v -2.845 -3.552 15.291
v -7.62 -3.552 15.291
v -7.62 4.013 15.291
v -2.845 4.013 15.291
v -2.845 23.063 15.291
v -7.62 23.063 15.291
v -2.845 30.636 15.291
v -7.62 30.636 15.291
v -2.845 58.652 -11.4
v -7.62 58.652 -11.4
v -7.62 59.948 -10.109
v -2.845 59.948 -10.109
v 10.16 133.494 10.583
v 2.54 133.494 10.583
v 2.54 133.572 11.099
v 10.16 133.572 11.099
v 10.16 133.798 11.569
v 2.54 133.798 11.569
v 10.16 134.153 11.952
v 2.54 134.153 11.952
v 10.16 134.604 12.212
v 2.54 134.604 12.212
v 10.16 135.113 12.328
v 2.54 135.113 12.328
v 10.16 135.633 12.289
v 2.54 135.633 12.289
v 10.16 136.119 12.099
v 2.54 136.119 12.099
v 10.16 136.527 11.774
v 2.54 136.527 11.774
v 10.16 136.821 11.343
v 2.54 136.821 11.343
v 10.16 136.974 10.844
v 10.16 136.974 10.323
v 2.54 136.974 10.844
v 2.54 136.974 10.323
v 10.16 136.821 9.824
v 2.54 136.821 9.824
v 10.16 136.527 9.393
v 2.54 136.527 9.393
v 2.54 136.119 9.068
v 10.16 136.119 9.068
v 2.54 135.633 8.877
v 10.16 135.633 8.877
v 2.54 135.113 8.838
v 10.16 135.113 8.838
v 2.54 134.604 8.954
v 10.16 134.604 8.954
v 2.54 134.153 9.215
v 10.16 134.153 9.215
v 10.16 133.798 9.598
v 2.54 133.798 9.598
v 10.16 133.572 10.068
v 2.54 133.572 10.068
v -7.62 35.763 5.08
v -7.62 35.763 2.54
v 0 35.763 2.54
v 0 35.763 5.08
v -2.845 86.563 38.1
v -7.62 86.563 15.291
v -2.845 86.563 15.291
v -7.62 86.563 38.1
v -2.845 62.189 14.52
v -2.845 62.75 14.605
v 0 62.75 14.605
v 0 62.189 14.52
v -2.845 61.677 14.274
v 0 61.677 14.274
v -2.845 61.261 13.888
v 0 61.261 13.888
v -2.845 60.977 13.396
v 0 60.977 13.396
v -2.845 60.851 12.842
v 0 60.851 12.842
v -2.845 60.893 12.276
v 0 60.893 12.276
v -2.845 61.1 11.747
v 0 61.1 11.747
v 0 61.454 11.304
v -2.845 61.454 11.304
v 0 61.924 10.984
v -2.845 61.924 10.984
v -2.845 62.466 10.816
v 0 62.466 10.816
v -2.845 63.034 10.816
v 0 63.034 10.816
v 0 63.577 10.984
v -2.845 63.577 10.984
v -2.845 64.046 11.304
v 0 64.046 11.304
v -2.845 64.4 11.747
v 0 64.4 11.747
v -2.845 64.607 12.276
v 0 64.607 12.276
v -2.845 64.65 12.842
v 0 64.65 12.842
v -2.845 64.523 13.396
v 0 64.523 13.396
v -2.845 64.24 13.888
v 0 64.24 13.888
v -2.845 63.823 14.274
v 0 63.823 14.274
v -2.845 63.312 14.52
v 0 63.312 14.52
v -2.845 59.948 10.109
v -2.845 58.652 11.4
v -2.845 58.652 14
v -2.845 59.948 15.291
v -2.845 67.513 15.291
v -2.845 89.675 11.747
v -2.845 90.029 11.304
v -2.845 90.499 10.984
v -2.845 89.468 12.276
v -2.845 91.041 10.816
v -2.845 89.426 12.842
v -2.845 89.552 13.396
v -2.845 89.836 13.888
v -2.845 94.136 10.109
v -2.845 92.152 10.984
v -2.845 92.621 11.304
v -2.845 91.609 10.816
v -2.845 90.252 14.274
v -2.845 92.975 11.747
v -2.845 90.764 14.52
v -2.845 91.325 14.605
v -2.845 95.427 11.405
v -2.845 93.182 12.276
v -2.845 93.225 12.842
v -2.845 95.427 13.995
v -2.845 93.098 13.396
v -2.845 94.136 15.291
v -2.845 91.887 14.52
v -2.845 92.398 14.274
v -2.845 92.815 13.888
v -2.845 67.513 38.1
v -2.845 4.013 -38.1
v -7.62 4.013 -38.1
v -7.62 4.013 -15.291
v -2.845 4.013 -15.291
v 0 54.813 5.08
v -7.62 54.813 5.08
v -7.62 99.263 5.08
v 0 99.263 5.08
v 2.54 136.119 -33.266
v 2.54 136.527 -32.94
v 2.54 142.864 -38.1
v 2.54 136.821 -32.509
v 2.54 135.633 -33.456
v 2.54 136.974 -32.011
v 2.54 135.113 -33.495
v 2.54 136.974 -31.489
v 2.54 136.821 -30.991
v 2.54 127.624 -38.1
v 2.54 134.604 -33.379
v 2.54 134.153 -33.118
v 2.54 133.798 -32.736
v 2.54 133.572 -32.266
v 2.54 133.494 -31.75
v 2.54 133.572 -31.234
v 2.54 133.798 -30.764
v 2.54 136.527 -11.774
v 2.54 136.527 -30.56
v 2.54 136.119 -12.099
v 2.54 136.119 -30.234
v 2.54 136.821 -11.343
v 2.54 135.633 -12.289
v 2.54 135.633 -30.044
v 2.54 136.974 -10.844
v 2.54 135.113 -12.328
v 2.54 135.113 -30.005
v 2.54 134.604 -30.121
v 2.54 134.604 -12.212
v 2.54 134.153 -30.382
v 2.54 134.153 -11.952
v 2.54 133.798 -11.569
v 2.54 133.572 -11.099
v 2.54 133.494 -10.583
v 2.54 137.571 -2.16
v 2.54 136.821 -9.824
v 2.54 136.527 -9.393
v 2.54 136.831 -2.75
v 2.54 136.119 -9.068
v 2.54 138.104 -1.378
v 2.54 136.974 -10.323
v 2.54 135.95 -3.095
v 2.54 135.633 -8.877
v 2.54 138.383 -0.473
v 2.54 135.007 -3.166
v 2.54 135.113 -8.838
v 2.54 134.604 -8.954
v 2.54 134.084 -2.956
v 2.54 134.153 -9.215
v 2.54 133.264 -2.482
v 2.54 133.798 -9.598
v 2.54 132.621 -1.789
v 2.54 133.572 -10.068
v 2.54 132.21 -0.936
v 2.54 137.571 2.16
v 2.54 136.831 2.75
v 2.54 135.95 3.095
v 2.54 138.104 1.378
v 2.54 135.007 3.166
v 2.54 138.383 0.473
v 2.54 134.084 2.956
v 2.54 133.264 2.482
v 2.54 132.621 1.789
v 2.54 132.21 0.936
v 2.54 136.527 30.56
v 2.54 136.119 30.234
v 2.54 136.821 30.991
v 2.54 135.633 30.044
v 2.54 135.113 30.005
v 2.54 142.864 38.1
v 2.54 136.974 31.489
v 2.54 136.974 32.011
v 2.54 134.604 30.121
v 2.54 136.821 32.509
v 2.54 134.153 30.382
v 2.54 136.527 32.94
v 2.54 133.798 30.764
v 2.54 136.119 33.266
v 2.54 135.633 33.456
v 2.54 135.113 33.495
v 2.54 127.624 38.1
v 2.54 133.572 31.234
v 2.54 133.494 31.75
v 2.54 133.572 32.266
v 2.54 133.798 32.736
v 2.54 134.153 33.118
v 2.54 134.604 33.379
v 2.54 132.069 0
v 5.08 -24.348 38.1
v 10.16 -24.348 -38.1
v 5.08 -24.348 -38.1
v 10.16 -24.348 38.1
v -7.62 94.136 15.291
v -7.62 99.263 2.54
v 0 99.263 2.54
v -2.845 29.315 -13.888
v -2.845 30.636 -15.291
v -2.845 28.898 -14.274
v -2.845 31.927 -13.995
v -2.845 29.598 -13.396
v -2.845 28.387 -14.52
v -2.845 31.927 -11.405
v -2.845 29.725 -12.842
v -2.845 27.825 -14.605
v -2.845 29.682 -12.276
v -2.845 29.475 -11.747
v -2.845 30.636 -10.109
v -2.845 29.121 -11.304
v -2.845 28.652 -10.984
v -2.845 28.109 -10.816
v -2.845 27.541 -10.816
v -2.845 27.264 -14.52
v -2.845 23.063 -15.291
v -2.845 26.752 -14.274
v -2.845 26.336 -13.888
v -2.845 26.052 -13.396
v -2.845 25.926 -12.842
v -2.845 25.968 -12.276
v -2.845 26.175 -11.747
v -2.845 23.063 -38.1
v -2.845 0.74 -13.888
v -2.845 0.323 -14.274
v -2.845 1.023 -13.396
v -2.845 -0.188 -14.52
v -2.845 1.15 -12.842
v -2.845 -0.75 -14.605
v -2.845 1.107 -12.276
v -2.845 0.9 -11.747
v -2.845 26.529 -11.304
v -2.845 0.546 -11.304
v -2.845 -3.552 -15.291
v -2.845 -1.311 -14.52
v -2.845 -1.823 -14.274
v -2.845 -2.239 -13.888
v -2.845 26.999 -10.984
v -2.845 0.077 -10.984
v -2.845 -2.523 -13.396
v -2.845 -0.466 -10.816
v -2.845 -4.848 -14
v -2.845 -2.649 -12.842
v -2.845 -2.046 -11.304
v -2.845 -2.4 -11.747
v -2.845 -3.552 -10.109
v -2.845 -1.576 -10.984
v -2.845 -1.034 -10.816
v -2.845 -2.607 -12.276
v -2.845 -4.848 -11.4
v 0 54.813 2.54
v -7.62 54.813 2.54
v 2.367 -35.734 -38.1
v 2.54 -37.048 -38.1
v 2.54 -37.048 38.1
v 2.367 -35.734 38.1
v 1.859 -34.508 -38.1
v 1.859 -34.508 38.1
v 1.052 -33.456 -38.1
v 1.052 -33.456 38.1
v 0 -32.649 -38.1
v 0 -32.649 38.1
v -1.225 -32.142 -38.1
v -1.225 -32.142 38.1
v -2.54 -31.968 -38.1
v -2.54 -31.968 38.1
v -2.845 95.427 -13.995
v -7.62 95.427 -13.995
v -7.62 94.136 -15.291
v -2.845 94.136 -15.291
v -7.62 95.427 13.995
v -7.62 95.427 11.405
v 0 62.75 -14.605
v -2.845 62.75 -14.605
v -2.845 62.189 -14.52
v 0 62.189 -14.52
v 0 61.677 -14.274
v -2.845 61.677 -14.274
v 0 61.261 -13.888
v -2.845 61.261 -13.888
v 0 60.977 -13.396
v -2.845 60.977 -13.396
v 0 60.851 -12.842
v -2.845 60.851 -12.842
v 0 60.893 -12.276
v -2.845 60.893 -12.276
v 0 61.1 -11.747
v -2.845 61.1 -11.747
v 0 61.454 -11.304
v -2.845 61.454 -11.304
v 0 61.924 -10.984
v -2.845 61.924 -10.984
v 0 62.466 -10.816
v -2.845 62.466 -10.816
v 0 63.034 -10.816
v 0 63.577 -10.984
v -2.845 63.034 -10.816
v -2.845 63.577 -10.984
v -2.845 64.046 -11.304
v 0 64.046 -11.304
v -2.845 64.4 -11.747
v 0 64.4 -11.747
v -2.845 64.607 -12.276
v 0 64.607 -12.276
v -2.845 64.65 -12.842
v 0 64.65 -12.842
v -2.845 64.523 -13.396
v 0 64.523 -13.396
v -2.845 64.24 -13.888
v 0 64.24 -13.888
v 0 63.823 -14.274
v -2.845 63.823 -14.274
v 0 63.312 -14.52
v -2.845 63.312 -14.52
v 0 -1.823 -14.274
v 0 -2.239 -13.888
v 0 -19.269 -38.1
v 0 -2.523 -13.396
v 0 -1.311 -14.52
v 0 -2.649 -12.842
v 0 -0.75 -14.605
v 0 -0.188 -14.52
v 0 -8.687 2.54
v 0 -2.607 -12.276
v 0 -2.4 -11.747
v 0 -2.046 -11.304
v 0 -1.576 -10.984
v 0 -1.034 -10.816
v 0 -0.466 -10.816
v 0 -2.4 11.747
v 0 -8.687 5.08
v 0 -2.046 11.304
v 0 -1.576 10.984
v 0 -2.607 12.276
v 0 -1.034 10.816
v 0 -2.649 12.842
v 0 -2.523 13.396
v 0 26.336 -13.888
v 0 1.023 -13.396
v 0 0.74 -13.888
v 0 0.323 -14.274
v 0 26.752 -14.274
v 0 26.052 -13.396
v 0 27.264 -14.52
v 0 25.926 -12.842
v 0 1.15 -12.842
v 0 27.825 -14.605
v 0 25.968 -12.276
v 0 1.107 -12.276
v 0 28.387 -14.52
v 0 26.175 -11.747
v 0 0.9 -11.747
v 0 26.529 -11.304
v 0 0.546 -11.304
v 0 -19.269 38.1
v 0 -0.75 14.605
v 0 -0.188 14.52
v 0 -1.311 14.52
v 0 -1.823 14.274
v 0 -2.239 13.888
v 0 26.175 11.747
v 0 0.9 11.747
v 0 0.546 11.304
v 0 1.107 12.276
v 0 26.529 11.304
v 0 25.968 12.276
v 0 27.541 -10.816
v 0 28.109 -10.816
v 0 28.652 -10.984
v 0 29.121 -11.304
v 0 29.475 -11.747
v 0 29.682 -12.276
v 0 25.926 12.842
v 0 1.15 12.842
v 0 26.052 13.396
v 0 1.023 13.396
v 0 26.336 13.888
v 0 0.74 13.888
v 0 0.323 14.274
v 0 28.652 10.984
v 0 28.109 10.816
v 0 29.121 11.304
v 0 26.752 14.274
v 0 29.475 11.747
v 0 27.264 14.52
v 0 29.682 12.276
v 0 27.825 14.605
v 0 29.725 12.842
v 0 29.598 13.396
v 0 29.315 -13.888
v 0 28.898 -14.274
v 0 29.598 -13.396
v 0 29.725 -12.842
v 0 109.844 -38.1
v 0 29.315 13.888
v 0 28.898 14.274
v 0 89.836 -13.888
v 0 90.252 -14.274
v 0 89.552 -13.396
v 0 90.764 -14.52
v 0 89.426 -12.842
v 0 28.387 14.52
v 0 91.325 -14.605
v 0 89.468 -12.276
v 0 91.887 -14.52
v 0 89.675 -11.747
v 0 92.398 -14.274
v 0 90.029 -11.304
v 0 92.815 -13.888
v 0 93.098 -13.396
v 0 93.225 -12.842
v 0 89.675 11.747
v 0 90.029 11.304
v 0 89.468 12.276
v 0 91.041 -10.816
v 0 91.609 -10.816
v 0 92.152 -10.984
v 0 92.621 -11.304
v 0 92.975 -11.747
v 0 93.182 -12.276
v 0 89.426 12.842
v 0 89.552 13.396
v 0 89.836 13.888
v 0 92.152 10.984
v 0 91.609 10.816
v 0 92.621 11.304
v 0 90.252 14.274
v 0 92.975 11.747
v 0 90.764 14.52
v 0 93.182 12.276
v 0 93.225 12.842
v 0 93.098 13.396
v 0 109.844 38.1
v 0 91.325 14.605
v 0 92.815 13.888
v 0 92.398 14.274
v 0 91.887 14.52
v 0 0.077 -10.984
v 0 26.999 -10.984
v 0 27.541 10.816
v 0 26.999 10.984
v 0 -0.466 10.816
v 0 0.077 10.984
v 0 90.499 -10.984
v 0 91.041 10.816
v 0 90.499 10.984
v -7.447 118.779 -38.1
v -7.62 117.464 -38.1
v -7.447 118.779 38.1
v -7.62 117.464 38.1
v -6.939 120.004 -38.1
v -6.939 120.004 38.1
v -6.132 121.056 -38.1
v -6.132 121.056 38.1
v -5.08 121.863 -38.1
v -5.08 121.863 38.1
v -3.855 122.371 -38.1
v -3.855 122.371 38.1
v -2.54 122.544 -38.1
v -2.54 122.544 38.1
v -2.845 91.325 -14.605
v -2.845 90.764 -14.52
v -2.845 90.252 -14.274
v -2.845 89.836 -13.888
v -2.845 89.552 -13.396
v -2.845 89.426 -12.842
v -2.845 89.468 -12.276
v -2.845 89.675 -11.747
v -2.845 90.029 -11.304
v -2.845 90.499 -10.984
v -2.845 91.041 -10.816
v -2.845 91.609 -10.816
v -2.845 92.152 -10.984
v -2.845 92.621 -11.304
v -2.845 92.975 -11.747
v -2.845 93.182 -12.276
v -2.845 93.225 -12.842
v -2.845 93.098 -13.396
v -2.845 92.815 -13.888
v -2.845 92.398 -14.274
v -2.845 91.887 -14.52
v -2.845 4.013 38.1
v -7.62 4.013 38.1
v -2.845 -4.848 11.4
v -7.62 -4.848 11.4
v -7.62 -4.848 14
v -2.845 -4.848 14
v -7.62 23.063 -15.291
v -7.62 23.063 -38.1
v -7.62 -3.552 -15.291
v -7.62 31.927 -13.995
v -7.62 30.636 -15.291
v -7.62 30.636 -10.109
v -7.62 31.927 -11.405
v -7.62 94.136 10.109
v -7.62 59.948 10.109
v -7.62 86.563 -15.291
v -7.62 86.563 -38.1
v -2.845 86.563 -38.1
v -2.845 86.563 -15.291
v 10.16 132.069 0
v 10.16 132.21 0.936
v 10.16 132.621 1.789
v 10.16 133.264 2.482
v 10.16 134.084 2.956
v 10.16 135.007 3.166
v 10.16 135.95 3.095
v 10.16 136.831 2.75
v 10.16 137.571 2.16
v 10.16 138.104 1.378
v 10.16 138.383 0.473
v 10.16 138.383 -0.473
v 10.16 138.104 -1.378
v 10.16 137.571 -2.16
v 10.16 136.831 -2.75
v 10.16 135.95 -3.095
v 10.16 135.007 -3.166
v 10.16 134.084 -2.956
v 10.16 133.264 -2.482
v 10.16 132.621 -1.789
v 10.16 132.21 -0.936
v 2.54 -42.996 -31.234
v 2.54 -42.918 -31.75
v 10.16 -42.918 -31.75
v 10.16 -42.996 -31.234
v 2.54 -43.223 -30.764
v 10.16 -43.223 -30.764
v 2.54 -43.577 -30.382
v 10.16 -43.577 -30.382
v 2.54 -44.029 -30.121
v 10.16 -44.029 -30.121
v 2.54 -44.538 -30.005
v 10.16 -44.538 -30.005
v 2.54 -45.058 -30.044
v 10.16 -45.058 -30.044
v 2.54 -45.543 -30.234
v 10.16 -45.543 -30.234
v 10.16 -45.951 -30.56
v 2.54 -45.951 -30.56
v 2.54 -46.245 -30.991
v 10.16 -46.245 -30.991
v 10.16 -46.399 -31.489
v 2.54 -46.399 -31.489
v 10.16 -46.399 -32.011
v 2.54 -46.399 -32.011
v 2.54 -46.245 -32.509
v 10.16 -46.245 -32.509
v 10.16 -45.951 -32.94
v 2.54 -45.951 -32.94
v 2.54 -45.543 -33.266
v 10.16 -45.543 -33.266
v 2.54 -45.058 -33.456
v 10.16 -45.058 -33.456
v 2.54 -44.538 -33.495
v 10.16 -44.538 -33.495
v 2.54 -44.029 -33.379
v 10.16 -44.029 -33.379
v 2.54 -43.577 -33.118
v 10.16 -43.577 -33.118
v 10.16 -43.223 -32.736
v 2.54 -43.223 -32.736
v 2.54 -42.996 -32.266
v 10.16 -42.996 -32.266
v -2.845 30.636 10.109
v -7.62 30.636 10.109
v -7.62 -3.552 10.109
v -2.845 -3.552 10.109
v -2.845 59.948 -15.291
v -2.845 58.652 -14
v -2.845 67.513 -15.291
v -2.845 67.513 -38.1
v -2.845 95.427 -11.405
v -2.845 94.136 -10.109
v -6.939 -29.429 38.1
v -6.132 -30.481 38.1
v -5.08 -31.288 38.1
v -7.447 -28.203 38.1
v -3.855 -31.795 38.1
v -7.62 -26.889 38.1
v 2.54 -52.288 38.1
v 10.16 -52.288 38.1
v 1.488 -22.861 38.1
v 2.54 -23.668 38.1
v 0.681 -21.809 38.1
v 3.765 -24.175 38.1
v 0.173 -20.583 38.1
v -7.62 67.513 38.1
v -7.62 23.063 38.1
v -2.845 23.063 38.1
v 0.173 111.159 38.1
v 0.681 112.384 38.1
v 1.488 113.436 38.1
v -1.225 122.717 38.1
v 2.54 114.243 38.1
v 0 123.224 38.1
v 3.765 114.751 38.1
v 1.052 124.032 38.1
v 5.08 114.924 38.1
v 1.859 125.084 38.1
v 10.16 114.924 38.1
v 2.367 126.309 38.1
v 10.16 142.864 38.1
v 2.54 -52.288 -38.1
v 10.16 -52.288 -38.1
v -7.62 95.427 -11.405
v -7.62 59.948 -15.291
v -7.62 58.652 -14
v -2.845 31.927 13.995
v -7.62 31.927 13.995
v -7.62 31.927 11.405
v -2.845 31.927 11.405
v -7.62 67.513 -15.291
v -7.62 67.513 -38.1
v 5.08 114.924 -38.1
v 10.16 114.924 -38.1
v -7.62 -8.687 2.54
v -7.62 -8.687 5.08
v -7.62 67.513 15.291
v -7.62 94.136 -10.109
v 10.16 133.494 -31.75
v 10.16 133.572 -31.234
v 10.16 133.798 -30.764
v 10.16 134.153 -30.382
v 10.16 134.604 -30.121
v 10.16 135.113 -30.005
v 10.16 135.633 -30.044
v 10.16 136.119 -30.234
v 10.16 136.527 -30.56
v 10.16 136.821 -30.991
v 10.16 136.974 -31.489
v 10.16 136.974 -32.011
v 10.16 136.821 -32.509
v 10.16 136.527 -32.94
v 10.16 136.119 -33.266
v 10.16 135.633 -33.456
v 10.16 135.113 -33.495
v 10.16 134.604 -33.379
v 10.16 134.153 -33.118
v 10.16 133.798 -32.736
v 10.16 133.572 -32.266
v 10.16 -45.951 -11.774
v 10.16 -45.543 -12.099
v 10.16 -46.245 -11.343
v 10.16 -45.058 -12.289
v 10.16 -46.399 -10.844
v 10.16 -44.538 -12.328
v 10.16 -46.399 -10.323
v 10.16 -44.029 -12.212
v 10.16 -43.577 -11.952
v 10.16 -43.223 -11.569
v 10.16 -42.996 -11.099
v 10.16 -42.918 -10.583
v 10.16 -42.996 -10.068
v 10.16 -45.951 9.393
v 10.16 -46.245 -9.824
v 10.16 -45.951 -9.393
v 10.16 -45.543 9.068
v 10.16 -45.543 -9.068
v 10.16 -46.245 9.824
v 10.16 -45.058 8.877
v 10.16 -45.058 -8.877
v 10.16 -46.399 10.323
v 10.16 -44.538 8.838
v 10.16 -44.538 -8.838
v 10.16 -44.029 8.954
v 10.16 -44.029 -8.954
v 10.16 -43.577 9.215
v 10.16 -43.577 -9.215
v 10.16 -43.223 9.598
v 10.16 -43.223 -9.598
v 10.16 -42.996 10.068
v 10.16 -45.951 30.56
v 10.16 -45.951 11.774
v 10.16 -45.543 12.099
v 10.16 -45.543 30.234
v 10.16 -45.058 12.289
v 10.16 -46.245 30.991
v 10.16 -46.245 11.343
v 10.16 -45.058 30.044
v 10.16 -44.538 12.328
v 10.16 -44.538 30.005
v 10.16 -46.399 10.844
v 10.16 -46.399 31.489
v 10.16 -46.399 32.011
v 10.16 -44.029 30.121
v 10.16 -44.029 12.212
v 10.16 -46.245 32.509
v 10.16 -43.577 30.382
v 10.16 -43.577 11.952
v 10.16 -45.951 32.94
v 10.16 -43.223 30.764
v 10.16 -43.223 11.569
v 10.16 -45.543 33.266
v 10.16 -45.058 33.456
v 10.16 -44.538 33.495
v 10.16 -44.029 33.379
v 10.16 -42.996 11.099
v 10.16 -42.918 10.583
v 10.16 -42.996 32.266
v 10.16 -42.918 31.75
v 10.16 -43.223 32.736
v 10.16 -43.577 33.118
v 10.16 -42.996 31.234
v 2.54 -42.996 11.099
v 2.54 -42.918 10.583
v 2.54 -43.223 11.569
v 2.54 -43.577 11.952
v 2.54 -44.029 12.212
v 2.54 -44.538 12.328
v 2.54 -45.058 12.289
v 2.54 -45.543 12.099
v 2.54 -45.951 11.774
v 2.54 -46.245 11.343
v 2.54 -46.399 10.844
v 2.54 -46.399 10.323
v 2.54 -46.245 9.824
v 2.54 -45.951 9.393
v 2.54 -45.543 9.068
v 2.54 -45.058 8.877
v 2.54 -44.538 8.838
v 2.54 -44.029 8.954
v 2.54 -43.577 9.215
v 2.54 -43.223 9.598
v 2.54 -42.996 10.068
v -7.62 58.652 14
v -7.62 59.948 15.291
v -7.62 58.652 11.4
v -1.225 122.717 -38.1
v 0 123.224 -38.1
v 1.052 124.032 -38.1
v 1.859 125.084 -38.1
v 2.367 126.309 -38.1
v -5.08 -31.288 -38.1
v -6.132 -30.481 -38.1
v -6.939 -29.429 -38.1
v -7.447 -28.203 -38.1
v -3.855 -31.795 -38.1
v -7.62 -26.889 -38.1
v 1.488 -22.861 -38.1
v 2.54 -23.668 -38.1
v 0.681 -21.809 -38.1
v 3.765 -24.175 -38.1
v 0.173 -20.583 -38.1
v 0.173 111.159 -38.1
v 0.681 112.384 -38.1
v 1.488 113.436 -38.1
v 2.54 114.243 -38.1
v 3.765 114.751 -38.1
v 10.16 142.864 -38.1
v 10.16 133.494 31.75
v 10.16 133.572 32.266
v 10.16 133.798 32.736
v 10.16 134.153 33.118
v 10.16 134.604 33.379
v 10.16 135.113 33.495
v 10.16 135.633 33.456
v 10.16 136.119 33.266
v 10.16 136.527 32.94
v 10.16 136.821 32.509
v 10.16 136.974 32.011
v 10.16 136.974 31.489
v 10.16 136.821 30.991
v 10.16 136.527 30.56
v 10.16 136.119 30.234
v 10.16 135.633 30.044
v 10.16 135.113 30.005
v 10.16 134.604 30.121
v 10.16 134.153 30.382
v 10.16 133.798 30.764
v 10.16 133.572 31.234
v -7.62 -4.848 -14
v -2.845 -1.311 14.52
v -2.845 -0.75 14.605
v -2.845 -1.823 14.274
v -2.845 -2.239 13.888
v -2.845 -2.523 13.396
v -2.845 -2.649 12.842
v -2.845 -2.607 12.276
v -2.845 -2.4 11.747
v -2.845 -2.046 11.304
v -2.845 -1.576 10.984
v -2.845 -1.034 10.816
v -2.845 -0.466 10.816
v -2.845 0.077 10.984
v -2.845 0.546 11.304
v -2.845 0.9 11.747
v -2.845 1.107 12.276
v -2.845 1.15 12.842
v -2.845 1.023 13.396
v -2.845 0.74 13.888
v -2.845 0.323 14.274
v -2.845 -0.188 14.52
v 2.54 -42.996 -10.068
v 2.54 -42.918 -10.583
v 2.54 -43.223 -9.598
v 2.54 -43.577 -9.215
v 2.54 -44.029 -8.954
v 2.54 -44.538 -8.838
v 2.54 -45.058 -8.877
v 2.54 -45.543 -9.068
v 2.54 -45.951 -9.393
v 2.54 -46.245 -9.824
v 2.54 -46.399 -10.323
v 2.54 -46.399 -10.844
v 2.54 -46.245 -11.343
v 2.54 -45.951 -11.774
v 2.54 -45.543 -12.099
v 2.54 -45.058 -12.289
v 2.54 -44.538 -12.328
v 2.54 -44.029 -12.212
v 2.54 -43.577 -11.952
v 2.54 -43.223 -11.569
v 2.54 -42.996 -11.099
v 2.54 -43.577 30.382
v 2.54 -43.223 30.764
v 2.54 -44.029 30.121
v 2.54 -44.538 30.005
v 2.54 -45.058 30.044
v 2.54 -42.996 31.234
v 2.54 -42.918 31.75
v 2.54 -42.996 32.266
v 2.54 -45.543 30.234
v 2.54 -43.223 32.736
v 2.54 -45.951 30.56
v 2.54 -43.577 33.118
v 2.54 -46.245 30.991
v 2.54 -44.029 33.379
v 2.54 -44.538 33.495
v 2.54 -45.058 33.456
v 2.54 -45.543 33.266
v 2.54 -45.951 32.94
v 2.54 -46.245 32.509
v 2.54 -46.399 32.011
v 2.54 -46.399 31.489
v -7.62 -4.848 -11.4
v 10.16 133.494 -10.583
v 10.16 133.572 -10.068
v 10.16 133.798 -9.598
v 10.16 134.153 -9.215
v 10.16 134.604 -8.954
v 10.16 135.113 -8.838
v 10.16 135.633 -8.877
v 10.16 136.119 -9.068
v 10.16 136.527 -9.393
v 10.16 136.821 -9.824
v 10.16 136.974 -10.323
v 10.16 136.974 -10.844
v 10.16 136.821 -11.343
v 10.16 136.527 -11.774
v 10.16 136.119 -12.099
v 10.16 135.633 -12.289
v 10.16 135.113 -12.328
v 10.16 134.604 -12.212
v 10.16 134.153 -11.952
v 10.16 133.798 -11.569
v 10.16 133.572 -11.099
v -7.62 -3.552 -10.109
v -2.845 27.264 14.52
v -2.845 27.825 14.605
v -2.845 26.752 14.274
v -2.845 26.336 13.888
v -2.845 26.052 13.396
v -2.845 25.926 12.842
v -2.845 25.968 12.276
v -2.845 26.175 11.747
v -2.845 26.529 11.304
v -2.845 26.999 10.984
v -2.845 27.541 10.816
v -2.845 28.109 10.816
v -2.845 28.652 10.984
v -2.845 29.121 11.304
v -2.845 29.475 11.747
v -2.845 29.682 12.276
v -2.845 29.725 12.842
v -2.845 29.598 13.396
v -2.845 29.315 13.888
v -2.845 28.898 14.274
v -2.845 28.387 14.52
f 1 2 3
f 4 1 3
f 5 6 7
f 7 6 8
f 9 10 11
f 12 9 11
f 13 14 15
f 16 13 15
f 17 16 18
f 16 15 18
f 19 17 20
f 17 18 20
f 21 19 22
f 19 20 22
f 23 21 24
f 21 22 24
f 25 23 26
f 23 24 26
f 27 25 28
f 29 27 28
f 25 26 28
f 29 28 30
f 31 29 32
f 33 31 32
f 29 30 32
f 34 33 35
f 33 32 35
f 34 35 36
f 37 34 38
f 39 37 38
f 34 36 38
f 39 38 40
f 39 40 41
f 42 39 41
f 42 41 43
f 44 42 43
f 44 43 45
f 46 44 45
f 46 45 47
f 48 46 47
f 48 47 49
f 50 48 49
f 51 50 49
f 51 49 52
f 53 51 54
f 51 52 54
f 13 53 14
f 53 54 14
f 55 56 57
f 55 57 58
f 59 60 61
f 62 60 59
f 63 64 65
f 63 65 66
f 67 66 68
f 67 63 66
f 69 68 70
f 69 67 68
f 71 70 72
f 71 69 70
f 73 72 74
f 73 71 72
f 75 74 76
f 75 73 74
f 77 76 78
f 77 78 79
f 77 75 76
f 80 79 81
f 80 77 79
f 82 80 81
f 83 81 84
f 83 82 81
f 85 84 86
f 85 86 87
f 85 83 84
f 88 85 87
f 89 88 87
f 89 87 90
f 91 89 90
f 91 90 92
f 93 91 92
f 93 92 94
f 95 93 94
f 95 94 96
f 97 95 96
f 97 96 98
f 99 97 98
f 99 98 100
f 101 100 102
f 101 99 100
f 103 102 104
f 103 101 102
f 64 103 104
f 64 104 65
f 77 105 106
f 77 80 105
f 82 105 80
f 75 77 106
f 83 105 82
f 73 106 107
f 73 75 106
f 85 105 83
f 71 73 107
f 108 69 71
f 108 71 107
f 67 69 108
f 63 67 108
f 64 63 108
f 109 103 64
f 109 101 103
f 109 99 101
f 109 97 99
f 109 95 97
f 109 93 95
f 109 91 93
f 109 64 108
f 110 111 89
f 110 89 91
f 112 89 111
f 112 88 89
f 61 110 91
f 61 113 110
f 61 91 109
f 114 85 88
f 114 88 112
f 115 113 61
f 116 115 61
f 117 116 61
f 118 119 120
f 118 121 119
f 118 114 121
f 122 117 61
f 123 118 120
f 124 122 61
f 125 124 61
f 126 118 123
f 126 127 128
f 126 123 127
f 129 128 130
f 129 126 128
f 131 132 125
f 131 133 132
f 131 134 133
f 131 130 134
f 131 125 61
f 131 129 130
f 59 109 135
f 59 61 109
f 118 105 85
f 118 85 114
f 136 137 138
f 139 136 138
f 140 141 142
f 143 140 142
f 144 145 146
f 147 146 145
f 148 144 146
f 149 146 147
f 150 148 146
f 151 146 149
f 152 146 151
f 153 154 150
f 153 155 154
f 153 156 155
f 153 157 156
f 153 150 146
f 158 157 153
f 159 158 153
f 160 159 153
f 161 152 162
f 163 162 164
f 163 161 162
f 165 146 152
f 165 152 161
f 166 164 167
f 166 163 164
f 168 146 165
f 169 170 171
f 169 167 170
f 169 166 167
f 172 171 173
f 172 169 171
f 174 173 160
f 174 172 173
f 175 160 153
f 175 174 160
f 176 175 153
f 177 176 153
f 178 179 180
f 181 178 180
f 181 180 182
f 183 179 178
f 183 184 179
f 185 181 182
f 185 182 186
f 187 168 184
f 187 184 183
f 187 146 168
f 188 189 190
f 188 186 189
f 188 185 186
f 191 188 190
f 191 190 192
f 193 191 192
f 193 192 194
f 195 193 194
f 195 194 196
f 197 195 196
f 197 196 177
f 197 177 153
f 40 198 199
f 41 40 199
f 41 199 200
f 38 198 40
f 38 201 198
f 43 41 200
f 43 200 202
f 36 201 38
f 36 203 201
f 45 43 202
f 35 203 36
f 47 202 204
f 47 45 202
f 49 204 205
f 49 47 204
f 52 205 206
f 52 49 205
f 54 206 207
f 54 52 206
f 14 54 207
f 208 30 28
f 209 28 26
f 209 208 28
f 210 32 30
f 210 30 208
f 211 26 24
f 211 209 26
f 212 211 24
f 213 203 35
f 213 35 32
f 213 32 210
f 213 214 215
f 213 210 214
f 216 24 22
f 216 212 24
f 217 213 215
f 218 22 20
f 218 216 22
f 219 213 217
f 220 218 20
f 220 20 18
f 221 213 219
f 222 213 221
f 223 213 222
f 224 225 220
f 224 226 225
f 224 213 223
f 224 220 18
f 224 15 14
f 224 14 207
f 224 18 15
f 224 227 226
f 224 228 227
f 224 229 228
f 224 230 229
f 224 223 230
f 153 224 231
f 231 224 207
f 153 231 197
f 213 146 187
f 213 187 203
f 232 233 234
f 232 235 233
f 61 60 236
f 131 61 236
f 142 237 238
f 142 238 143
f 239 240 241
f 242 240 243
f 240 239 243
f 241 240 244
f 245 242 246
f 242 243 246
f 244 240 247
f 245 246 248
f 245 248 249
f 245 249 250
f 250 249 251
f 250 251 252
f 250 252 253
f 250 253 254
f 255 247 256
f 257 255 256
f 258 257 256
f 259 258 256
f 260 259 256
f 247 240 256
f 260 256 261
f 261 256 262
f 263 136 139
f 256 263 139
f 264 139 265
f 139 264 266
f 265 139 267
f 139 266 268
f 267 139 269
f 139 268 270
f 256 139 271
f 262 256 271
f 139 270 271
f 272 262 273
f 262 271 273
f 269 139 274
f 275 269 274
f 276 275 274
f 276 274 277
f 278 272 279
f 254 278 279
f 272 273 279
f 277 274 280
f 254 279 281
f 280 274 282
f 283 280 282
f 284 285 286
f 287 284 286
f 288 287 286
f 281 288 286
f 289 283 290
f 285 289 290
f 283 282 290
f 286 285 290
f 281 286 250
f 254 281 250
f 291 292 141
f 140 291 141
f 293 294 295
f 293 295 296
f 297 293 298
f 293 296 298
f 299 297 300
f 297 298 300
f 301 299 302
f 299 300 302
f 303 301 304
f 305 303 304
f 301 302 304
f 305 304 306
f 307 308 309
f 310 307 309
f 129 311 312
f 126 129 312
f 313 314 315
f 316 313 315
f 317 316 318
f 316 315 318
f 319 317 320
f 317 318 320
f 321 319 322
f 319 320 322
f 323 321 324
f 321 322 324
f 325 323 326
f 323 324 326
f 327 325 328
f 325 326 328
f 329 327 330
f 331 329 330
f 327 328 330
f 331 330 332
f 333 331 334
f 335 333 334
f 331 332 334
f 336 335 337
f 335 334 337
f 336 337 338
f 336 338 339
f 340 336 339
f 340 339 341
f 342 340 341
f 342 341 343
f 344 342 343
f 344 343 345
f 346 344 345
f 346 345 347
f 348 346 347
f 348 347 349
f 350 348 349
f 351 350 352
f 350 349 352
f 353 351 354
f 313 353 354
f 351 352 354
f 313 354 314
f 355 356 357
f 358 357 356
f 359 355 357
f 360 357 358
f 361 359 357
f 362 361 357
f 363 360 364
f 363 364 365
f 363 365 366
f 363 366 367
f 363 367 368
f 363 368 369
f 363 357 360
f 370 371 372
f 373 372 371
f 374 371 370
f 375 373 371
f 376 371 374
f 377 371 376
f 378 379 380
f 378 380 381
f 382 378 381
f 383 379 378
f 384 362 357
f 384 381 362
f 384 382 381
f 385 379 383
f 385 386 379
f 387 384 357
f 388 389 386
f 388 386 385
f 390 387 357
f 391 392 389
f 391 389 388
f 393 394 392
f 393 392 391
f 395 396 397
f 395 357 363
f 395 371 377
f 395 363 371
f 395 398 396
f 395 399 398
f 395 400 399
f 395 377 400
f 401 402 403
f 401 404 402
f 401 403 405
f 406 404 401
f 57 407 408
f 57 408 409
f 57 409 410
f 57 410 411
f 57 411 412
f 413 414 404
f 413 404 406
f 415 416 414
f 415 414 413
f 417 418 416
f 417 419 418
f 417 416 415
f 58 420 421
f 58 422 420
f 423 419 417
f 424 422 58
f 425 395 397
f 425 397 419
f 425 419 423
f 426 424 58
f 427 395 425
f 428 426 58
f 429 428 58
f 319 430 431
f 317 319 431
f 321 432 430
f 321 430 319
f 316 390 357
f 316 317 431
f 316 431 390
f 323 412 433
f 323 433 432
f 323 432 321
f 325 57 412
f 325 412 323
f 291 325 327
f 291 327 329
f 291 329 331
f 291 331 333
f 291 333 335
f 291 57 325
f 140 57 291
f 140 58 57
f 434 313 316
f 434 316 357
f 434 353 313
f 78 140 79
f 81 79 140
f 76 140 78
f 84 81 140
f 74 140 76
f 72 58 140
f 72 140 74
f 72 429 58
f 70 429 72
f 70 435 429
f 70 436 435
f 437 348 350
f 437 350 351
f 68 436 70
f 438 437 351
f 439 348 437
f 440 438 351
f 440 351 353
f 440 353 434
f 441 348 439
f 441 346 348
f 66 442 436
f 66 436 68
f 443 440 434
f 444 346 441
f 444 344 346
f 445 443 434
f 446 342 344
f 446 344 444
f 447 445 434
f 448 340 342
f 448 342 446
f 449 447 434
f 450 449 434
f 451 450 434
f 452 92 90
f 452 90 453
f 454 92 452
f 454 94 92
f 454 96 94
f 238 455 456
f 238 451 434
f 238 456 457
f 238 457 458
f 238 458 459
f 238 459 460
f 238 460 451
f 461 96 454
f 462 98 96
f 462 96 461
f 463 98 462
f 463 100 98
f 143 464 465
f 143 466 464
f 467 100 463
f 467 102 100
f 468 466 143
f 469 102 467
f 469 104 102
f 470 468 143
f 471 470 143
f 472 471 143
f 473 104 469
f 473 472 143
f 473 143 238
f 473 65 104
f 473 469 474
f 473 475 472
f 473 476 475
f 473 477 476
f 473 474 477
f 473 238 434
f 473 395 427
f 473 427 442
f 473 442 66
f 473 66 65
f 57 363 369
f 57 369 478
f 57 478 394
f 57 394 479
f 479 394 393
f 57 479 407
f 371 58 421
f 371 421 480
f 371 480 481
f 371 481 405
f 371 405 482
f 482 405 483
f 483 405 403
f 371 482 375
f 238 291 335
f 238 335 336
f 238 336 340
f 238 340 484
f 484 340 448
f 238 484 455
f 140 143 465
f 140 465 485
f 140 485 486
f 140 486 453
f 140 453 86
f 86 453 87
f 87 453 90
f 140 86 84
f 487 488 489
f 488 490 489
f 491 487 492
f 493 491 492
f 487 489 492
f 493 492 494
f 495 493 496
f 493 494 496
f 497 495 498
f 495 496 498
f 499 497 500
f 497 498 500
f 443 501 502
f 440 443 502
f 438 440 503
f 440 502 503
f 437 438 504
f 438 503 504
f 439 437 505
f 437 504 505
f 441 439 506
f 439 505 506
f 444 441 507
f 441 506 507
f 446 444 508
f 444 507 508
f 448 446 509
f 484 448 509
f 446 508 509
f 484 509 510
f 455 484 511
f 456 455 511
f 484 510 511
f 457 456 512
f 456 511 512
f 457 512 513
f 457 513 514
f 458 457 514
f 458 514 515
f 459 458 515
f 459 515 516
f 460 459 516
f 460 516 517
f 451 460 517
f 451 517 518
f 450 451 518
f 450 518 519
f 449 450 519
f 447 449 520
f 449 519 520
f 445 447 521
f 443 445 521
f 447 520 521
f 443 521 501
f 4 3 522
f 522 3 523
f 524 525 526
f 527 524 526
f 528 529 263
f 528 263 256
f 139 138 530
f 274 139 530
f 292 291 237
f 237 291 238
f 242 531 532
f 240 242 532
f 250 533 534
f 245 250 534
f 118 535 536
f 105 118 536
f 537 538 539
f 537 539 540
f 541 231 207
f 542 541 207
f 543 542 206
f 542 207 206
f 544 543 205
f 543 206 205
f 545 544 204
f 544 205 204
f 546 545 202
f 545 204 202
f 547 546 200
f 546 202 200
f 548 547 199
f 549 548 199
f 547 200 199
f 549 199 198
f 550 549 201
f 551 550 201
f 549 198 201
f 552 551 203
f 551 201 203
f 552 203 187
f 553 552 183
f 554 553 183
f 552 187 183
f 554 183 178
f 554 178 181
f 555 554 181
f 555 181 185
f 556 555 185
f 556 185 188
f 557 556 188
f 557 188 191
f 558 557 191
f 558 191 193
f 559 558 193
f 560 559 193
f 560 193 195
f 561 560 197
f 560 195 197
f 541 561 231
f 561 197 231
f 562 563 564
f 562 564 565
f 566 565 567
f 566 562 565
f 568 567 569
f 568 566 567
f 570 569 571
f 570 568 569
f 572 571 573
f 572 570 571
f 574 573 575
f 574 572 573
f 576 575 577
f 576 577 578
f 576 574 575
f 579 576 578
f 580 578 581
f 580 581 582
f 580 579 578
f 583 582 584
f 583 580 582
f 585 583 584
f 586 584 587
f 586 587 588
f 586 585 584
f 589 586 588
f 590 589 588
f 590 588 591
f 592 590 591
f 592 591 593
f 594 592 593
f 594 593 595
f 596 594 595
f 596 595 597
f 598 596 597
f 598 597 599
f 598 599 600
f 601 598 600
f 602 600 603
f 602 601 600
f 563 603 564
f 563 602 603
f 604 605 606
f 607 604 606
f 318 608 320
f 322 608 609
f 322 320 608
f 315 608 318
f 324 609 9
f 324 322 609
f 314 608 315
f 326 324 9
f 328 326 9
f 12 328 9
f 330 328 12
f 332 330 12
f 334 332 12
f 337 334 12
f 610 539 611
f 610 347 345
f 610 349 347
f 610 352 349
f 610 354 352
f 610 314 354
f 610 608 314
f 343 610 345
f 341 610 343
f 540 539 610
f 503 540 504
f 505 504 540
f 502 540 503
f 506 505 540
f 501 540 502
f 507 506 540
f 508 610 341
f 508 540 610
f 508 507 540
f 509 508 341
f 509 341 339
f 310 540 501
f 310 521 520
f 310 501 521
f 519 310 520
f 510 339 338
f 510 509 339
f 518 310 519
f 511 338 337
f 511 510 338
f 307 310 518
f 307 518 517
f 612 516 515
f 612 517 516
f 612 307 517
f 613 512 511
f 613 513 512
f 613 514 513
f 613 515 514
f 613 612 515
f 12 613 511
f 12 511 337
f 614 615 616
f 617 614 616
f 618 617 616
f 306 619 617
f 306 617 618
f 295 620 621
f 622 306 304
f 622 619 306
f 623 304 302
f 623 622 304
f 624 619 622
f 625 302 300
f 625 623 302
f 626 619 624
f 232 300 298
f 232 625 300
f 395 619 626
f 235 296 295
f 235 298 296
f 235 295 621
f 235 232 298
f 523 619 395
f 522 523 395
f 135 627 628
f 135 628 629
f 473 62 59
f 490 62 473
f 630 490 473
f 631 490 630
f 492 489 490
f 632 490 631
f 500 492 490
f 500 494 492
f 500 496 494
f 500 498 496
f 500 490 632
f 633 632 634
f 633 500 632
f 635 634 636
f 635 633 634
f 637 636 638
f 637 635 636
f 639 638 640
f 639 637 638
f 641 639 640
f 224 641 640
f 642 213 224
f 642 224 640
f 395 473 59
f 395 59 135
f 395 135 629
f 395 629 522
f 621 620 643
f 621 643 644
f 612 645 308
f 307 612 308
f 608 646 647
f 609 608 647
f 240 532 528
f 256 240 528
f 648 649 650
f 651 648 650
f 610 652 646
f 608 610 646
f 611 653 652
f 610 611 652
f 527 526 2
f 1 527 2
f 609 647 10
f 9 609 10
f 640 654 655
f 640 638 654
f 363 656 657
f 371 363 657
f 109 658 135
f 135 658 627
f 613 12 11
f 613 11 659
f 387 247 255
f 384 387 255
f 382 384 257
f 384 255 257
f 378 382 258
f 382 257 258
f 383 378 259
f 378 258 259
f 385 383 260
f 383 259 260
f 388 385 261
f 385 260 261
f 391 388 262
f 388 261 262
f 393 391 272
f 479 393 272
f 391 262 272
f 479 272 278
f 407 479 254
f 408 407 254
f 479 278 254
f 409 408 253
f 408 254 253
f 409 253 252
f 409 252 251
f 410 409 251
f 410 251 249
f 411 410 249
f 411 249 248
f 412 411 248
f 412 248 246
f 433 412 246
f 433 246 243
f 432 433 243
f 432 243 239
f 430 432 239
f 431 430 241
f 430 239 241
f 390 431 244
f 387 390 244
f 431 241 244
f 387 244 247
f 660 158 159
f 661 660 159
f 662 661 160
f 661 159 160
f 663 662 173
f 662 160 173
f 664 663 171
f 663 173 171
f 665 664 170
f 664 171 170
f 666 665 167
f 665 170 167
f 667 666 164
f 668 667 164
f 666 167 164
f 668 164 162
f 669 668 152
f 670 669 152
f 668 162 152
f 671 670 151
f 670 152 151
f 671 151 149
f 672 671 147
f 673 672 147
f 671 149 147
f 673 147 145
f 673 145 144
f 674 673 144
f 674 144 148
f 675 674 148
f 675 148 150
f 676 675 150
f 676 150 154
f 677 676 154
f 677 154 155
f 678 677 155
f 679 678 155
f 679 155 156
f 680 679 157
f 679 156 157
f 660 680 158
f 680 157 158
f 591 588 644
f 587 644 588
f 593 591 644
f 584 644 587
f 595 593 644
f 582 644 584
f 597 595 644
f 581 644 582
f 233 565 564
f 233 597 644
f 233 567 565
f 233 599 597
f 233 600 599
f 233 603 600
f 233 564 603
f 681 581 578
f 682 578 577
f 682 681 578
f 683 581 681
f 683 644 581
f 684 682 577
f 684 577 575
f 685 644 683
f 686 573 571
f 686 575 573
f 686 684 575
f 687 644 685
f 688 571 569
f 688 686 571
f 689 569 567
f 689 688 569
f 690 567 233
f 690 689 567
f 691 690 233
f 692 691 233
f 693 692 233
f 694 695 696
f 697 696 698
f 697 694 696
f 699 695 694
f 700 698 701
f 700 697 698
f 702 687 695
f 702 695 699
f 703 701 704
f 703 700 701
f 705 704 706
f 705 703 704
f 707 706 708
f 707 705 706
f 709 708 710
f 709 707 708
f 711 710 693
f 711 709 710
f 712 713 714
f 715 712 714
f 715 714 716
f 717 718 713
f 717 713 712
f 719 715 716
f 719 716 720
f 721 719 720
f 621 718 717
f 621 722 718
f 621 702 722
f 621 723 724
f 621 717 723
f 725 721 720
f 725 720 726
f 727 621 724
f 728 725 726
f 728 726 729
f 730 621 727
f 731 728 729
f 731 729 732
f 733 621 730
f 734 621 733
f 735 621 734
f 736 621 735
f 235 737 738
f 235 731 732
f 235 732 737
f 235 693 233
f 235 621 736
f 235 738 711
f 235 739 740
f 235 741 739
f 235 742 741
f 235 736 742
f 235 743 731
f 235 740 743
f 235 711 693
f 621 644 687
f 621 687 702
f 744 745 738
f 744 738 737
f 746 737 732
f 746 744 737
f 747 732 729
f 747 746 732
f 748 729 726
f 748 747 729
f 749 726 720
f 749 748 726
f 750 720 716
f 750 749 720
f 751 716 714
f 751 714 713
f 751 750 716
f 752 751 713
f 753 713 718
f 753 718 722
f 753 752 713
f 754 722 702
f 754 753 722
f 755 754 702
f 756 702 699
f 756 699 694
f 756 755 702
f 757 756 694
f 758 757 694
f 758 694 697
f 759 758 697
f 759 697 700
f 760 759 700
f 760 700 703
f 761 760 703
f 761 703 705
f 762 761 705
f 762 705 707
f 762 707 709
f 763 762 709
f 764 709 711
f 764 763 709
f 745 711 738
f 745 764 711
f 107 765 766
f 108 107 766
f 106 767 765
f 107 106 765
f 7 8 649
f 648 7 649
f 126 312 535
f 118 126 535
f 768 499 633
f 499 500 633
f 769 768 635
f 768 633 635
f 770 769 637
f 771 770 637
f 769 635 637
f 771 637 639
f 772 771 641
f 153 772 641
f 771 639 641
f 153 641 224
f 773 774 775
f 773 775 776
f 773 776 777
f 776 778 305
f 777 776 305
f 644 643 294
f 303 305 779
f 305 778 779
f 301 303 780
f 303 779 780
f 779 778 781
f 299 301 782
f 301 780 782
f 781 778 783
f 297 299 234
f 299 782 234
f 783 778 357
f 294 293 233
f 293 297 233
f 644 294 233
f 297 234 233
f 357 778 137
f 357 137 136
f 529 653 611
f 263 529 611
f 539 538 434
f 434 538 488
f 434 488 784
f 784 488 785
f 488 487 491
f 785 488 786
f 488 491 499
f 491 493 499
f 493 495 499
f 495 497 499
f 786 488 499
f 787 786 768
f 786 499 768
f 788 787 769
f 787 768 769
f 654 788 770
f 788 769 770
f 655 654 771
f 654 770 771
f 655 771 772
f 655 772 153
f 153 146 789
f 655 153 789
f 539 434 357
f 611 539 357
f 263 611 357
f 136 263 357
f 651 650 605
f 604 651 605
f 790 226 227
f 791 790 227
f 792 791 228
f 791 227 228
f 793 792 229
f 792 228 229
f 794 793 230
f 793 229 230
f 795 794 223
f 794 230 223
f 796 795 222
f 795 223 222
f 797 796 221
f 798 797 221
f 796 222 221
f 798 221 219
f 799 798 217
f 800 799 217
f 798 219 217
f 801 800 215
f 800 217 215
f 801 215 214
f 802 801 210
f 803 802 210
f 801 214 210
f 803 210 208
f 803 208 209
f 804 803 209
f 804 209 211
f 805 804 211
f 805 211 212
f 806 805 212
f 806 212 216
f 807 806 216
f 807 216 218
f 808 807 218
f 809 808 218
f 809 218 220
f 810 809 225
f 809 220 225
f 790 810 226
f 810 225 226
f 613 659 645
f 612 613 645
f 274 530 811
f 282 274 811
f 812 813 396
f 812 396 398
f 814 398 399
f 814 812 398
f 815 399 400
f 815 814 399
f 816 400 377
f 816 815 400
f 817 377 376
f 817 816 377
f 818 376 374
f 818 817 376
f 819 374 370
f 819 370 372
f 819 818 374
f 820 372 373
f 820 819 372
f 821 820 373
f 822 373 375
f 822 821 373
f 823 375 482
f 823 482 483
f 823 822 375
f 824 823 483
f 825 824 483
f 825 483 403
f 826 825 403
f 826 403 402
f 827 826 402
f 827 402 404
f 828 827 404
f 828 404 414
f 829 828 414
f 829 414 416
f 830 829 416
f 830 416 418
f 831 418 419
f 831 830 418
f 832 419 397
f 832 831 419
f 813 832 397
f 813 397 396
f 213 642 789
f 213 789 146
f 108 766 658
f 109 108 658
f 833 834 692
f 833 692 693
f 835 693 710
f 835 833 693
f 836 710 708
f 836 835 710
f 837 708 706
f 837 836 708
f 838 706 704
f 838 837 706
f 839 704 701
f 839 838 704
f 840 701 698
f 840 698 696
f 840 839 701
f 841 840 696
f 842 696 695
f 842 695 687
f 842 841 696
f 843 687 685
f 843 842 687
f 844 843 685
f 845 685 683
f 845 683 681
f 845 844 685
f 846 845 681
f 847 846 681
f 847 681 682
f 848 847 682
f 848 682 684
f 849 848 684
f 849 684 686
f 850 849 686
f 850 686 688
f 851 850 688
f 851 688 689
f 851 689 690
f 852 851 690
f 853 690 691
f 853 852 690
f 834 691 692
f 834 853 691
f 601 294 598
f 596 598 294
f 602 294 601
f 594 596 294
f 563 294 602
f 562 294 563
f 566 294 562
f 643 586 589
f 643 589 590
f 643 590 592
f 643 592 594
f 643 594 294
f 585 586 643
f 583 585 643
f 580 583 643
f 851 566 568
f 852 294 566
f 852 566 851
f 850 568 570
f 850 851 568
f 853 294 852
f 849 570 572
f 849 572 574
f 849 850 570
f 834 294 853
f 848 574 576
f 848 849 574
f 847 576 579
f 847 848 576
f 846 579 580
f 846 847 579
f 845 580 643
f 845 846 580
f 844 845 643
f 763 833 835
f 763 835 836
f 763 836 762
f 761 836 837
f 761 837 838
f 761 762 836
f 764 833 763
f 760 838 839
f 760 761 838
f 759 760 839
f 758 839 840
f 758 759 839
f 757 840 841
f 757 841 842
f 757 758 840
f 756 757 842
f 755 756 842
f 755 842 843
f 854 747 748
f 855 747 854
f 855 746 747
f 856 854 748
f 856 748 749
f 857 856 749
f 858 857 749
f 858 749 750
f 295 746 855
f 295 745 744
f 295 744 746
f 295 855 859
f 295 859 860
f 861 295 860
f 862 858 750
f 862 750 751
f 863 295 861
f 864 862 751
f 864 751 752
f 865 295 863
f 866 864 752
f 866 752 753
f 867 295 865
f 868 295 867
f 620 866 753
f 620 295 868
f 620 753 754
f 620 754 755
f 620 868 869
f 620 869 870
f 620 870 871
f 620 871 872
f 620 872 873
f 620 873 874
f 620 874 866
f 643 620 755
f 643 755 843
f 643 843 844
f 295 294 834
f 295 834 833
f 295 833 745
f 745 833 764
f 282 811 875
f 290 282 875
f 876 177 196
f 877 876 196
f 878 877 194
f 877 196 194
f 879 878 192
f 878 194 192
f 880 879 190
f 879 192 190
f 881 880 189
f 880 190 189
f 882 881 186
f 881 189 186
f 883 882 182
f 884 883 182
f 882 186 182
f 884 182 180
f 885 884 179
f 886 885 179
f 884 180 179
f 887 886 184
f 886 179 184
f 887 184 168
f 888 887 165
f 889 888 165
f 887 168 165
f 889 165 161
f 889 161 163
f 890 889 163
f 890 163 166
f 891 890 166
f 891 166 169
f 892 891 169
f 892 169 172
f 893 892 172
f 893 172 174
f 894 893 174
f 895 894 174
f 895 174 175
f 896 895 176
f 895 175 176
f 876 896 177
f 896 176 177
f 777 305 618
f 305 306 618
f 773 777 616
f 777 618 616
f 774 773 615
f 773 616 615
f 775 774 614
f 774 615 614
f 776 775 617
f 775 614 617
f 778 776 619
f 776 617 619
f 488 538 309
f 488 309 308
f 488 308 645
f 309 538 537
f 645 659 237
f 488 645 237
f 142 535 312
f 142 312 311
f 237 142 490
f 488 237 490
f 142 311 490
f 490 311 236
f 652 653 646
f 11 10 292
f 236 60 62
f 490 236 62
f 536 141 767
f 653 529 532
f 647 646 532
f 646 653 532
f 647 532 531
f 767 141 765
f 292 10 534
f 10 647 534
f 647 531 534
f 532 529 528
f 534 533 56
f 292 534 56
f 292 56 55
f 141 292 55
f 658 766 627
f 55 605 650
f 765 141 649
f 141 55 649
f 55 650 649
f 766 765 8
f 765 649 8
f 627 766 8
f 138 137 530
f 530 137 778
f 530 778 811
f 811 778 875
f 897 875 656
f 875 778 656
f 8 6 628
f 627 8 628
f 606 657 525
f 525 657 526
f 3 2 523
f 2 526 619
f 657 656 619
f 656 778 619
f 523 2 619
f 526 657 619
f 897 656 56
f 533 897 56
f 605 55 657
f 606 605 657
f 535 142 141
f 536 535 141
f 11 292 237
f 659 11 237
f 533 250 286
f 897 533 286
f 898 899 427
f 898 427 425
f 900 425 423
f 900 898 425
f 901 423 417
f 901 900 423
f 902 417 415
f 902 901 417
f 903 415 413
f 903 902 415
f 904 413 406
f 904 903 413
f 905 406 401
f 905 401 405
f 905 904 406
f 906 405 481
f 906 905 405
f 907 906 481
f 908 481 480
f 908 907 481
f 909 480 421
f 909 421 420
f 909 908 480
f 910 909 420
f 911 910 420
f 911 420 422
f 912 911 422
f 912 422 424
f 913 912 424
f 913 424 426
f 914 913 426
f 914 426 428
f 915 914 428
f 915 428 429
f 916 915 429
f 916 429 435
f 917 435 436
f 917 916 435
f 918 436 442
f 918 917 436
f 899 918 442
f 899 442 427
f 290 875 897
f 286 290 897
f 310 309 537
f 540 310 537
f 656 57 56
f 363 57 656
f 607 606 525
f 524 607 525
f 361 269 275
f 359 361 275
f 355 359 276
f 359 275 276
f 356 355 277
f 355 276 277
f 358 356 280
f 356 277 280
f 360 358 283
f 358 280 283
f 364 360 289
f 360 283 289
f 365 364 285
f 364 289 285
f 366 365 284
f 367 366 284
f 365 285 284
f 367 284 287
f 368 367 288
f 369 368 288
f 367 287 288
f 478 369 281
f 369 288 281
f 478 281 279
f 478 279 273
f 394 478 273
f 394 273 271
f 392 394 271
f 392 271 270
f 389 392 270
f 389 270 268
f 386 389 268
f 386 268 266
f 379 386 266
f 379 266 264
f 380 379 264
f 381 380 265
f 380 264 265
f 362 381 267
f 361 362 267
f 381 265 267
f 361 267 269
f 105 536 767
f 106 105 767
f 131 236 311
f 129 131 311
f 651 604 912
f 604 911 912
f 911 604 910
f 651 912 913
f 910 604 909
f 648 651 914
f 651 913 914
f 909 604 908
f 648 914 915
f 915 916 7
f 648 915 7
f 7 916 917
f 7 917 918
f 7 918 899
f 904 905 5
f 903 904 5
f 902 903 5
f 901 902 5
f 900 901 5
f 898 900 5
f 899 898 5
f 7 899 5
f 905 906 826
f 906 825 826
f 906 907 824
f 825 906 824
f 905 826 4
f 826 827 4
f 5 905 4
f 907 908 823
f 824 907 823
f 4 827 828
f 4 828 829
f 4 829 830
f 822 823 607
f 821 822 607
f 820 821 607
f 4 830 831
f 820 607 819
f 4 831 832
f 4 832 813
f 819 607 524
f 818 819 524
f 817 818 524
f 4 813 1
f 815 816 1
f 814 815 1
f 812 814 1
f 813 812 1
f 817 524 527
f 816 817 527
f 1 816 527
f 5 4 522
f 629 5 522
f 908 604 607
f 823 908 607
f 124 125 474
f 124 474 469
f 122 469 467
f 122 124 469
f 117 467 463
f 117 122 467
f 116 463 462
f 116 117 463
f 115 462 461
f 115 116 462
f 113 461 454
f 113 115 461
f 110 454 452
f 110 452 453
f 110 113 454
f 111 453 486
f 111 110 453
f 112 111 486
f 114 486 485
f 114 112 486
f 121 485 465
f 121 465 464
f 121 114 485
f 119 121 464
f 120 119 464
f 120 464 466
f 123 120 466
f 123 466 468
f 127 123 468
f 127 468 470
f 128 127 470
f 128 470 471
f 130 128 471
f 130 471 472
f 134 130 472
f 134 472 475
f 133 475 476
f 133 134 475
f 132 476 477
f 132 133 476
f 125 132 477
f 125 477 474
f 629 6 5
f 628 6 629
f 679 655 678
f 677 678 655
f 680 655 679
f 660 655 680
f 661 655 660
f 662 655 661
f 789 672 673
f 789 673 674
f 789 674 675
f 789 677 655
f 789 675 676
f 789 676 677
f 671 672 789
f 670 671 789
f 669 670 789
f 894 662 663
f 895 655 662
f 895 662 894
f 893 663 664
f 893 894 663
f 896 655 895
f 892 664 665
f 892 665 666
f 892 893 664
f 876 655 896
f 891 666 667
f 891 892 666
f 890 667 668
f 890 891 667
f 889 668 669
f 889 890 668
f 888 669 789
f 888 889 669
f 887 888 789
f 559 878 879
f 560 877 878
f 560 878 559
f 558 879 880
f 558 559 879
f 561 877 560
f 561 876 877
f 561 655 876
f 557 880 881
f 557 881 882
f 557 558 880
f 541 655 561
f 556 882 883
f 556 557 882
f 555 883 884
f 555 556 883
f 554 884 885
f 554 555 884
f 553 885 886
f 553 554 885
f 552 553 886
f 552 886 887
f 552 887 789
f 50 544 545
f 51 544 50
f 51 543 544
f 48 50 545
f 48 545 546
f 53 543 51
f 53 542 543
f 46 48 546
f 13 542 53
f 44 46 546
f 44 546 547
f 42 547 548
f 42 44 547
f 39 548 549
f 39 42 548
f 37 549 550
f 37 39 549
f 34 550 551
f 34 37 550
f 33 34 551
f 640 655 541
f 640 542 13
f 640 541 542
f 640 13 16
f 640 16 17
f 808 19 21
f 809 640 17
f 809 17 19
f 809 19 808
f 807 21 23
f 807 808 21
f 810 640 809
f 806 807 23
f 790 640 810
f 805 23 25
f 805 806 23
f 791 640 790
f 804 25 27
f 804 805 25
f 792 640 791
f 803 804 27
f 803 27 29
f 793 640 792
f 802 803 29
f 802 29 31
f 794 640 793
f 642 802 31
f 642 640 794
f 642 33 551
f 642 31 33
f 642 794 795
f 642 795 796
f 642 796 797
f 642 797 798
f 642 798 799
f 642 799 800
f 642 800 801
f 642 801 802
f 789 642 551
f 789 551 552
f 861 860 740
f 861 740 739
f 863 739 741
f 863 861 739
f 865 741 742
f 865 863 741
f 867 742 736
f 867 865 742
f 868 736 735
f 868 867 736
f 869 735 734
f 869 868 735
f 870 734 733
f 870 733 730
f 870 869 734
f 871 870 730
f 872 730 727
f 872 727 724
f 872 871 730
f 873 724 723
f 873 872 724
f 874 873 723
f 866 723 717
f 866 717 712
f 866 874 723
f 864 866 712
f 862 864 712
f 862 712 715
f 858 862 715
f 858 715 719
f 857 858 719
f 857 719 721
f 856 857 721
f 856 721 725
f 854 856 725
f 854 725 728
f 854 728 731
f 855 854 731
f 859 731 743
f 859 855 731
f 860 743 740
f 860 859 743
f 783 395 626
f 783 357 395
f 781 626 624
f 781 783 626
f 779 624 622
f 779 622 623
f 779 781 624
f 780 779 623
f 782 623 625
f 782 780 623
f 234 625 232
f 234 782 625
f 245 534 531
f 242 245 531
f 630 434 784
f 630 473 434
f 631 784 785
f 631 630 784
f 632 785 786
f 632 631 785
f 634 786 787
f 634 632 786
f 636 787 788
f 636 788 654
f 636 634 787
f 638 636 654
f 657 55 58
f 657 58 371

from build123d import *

# Parameters (mm, degrees)
BOSS_EXTRUDE1_DEPTH               = 38.1
FILLET1_R                         = 5.08
SKETCH8_R                         = 1.7499965
SKETCH8_R_2                       = 1.75
CUT_EXTRUDE2_DEPTH                = 7.62
F_1_8_0_15_DOWEL_HOLE1_AT_2_COUNT = 2
F_1_8_0_15_DOWEL_HOLE1_AT_2_PITCH = 28.575
F_1_8_0_15_DOWEL_HOLE1_AT_3_COUNT = 2
F_1_8_0_15_DOWEL_HOLE1_AT_3_PITCH = 34.925
F_1_8_0_15_DOWEL_HOLE1_AT_4_COUNT = 2
F_1_8_0_15_DOWEL_HOLE1_AT_4_PITCH = 63.5
CUT_EXTRUDE3_DEPTH                = 4.7752
LPATTERN1_COUNT                   = 2
LPATTERN1_PITCH                   = 63.5
LPATTERN1_COUNT_DIR2              = 2
LPATTERN1_PITCH_DIR2              = 25.4
SKETCH16_W                        = 2.54
SKETCH16_H                        = 44.45
CUT_EXTRUDE4_DEPTH                = 7.62
SKETCH17_W                        = 76.2
SKETCH17_H                        = 19.05
CUT_EXTRUDE5_DEPTH                = 4.7752
SKETCH19_W                        = 12.6492
SKETCH19_H                        = 19.05
SKETCH19_W_2                      = 5.0292
BOSS_EXTRUDE6_DEPTH               = 4.7752
SKETCH22_R                        = 3.175
CGTEST1_DEPTH                     = 7.62


with BuildPart() as part:
    # Sketch1 → Boss-Extrude1 (new, symmetric)
    with BuildSketch(Plane.XY):
        Polygon((0, -24.348466848), (0, 114.923832009), (10.16, 114.923832009), (10.16, 122.543832009), (10.16, 142.863832009), (2.54, 142.863832009), (2.54, 122.543832009), (-7.62, 122.543832009), (-7.62, 114.923832009), (-7.62, -31.968466848), (2.54, -31.968466848), (2.54, -52.288466848), (10.16, -52.288466848), (10.16, -31.968466848), (10.16, -24.348466848), align=None)
    extrude(amount=BOSS_EXTRUDE1_DEPTH, both=True)

    # Fillet1
    fillet1_edges = [part.edges().sort_by_distance(p)[0] for p in [
        (0, -24.348466848, 0),
        (2.54, -31.968466848, 0),
        (0, 114.923832009, 0),
        (2.54, 122.543832009, 0),
        (-7.62, 122.543832009, 0),
        (-7.62, -31.968466848, 0),
    ]]
    fillet(fillet1_edges, radius=FILLET1_R - 0.0001)  # a hair under: the kernel refuses the full size

    # Sketch8 → Cut-Extrude2 (cut)
    with BuildSketch(Plane.ZY.offset(-2.54)):
        with Locations(Location((-31.75, 135.243832009, 0), (0, 0, 270))):
            Circle(SKETCH8_R)
        with Locations(Location((31.75, 135.243832009, 0), (0, 0, 270))):
            Circle(SKETCH8_R)
        with Locations(Location((-10.583333333, 135.243832009, 0), (0, 0, 270))):
            Circle(SKETCH8_R_2)
        with Locations(Location((10.583333333, 135.243832009, 0), (0, 0, 270))):
            Circle(SKETCH8_R_2)
    cut_extrude2 = extrude(amount=-CUT_EXTRUDE2_DEPTH, mode=Mode.SUBTRACT)

    # Mirror1: Cut-Extrude2 across plane
    add(cut_extrude2.mirror(Plane.ZX.offset(45.28768258)), mode=Mode.SUBTRACT)

    # Sketch11 → 1/8 (0.15) Dowel Hole1 (revolve, cut)
    with BuildSketch(Plane(origin=(-7.62, 27.82518258, 12.7), x_dir=(0, 0, 1), z_dir=(0, 1, 0))):
        Polygon((0, 0), (0, 8.764639479), (1.905, 7.62), (1.905, 0), align=None)
    f_1_8_0_15_dowel_hole1 = revolve(axis=Axis((-13.97, 27.82518258, 12.7), (1, 0, 0)), mode=Mode.SUBTRACT)

    # 1/8 (0.15) Dowel Hole1 at 2: 1/8 (0.15) Dowel Hole1 ×2
    with Locations(*[(0, -i * F_1_8_0_15_DOWEL_HOLE1_AT_2_PITCH, 0) for i in range(1, F_1_8_0_15_DOWEL_HOLE1_AT_2_COUNT)]):
        add(f_1_8_0_15_dowel_hole1, mode=Mode.SUBTRACT)

    # 1/8 (0.15) Dowel Hole1 at 3: 1/8 (0.15) Dowel Hole1 ×2
    with Locations(*[(0, i * F_1_8_0_15_DOWEL_HOLE1_AT_3_PITCH, 0) for i in range(1, F_1_8_0_15_DOWEL_HOLE1_AT_3_COUNT)]):
        add(f_1_8_0_15_dowel_hole1, mode=Mode.SUBTRACT)

    # 1/8 (0.15) Dowel Hole1 at 4: 1/8 (0.15) Dowel Hole1 ×2
    with Locations(*[(0, i * F_1_8_0_15_DOWEL_HOLE1_AT_4_PITCH, 0) for i in range(1, F_1_8_0_15_DOWEL_HOLE1_AT_4_COUNT)]):
        add(f_1_8_0_15_dowel_hole1, mode=Mode.SUBTRACT)

    # Sketch14 → Cut-Extrude3 (cut)
    with BuildSketch(Plane.ZY.offset(7.62)):
        Polygon((13.9954, 95.427086941), (11.4046, 95.427086941), (10.1092, 94.136177076), (10.1092, 59.947777076), (11.400109865, 58.652377076), (12.7, 58.652377076), (13.999890135, 58.652377076), (15.2908, 59.947777076), (15.2908, 94.136177076), align=None)
    cut_extrude3 = extrude(amount=-CUT_EXTRUDE3_DEPTH, mode=Mode.SUBTRACT)

    # LPattern1: Cut-Extrude3 2 × 2
    with Locations(*[(0, -i * LPATTERN1_PITCH, -j * LPATTERN1_PITCH_DIR2) for i in range(LPATTERN1_COUNT) for j in range(LPATTERN1_COUNT_DIR2) if (i, j) != (0, 0)]):
        add(cut_extrude3, mode=Mode.SUBTRACT)

    # Mirror2: 1/8 (0.15) Dowel Hole1 across plane
    add(f_1_8_0_15_dowel_hole1.mirror(Plane.XY), mode=Mode.SUBTRACT)

    # Mirror2 copy 1 sketch → Mirror2 copy 1 (revolve, cut)
    with BuildSketch(Plane(origin=(-7.62, -0.74981742, -12.7), x_dir=(0, 0, -1), z_dir=(0, 1, 0))):
        Polygon((0, 0), (0, -8.764639479), (1.905, -7.62), (1.905, 0), align=None)
    revolve(axis=Axis((-13.97, -0.74981742, -12.7), (-1, 0, 0)), mode=Mode.SUBTRACT)

    # Mirror2 copy 2 sketch → Mirror2 copy 2 (revolve, cut)
    with BuildSketch(Plane(origin=(-7.62, 62.75018258, -12.7), x_dir=(0, 0, -1), z_dir=(0, 1, 0))):
        Polygon((0, 0), (0, -8.764639479), (1.905, -7.62), (1.905, 0), align=None)
    revolve(axis=Axis((-13.97, 62.75018258, -12.7), (-1, 0, 0)), mode=Mode.SUBTRACT)

    # Mirror2 copy 3 sketch → Mirror2 copy 3 (revolve, cut)
    with BuildSketch(Plane(origin=(-7.62, 91.32518258, -12.7), x_dir=(0, 0, -1), z_dir=(0, 1, 0))):
        Polygon((0, 0), (0, -8.764639479), (1.905, -7.62), (1.905, 0), align=None)
    revolve(axis=Axis((-13.97, 91.32518258, -12.7), (-1, 0, 0)), mode=Mode.SUBTRACT)

    # Sketch16 → Cut-Extrude4 (cut)
    with BuildSketch(Plane.ZY.offset(7.62)):
        with Locations((3.81, 77.03768258)):
            Rectangle(SKETCH16_W, SKETCH16_H)
    cut_extrude4 = extrude(amount=-CUT_EXTRUDE4_DEPTH, mode=Mode.SUBTRACT)

    # Sketch17 → Cut-Extrude5 (cut)
    with BuildSketch(Plane.ZY.offset(7.62)):
        with Locations((0, 77.03768258)):
            Rectangle(SKETCH17_W, SKETCH17_H)
    cut_extrude5 = extrude(amount=-CUT_EXTRUDE5_DEPTH, mode=Mode.SUBTRACT)

    # Sketch19 → Boss-Extrude6 (add)
    with BuildSketch(Plane.ZY.offset(2.8448)):
        with Locations((-3.7846, 77.03768258)):
            Rectangle(SKETCH19_W, SKETCH19_H)
        with Locations((7.5946, 77.03768258)):
            Rectangle(SKETCH19_W_2, SKETCH19_H)
    boss_extrude6 = extrude(amount=BOSS_EXTRUDE6_DEPTH)

    # Mirror3: Cut-Extrude4, Cut-Extrude5, Boss-Extrude6 across plane
    add(cut_extrude4.mirror(Plane.ZX.offset(45.28768258)), mode=Mode.SUBTRACT)
    add(cut_extrude5.mirror(Plane.ZX.offset(45.28768258)), mode=Mode.SUBTRACT)
    add(boss_extrude6.mirror(Plane.ZX.offset(45.28768258)))

    # Sketch22 → CGTest1 (cut)
    with BuildSketch(Plane.ZY.offset(-2.54)):
        with Locations(Location((0, 135.243832009, 0), (0, 0, 270))):
            Circle(SKETCH22_R)
    extrude(amount=-CGTEST1_DEPTH, mode=Mode.SUBTRACT)


solid = part.part
